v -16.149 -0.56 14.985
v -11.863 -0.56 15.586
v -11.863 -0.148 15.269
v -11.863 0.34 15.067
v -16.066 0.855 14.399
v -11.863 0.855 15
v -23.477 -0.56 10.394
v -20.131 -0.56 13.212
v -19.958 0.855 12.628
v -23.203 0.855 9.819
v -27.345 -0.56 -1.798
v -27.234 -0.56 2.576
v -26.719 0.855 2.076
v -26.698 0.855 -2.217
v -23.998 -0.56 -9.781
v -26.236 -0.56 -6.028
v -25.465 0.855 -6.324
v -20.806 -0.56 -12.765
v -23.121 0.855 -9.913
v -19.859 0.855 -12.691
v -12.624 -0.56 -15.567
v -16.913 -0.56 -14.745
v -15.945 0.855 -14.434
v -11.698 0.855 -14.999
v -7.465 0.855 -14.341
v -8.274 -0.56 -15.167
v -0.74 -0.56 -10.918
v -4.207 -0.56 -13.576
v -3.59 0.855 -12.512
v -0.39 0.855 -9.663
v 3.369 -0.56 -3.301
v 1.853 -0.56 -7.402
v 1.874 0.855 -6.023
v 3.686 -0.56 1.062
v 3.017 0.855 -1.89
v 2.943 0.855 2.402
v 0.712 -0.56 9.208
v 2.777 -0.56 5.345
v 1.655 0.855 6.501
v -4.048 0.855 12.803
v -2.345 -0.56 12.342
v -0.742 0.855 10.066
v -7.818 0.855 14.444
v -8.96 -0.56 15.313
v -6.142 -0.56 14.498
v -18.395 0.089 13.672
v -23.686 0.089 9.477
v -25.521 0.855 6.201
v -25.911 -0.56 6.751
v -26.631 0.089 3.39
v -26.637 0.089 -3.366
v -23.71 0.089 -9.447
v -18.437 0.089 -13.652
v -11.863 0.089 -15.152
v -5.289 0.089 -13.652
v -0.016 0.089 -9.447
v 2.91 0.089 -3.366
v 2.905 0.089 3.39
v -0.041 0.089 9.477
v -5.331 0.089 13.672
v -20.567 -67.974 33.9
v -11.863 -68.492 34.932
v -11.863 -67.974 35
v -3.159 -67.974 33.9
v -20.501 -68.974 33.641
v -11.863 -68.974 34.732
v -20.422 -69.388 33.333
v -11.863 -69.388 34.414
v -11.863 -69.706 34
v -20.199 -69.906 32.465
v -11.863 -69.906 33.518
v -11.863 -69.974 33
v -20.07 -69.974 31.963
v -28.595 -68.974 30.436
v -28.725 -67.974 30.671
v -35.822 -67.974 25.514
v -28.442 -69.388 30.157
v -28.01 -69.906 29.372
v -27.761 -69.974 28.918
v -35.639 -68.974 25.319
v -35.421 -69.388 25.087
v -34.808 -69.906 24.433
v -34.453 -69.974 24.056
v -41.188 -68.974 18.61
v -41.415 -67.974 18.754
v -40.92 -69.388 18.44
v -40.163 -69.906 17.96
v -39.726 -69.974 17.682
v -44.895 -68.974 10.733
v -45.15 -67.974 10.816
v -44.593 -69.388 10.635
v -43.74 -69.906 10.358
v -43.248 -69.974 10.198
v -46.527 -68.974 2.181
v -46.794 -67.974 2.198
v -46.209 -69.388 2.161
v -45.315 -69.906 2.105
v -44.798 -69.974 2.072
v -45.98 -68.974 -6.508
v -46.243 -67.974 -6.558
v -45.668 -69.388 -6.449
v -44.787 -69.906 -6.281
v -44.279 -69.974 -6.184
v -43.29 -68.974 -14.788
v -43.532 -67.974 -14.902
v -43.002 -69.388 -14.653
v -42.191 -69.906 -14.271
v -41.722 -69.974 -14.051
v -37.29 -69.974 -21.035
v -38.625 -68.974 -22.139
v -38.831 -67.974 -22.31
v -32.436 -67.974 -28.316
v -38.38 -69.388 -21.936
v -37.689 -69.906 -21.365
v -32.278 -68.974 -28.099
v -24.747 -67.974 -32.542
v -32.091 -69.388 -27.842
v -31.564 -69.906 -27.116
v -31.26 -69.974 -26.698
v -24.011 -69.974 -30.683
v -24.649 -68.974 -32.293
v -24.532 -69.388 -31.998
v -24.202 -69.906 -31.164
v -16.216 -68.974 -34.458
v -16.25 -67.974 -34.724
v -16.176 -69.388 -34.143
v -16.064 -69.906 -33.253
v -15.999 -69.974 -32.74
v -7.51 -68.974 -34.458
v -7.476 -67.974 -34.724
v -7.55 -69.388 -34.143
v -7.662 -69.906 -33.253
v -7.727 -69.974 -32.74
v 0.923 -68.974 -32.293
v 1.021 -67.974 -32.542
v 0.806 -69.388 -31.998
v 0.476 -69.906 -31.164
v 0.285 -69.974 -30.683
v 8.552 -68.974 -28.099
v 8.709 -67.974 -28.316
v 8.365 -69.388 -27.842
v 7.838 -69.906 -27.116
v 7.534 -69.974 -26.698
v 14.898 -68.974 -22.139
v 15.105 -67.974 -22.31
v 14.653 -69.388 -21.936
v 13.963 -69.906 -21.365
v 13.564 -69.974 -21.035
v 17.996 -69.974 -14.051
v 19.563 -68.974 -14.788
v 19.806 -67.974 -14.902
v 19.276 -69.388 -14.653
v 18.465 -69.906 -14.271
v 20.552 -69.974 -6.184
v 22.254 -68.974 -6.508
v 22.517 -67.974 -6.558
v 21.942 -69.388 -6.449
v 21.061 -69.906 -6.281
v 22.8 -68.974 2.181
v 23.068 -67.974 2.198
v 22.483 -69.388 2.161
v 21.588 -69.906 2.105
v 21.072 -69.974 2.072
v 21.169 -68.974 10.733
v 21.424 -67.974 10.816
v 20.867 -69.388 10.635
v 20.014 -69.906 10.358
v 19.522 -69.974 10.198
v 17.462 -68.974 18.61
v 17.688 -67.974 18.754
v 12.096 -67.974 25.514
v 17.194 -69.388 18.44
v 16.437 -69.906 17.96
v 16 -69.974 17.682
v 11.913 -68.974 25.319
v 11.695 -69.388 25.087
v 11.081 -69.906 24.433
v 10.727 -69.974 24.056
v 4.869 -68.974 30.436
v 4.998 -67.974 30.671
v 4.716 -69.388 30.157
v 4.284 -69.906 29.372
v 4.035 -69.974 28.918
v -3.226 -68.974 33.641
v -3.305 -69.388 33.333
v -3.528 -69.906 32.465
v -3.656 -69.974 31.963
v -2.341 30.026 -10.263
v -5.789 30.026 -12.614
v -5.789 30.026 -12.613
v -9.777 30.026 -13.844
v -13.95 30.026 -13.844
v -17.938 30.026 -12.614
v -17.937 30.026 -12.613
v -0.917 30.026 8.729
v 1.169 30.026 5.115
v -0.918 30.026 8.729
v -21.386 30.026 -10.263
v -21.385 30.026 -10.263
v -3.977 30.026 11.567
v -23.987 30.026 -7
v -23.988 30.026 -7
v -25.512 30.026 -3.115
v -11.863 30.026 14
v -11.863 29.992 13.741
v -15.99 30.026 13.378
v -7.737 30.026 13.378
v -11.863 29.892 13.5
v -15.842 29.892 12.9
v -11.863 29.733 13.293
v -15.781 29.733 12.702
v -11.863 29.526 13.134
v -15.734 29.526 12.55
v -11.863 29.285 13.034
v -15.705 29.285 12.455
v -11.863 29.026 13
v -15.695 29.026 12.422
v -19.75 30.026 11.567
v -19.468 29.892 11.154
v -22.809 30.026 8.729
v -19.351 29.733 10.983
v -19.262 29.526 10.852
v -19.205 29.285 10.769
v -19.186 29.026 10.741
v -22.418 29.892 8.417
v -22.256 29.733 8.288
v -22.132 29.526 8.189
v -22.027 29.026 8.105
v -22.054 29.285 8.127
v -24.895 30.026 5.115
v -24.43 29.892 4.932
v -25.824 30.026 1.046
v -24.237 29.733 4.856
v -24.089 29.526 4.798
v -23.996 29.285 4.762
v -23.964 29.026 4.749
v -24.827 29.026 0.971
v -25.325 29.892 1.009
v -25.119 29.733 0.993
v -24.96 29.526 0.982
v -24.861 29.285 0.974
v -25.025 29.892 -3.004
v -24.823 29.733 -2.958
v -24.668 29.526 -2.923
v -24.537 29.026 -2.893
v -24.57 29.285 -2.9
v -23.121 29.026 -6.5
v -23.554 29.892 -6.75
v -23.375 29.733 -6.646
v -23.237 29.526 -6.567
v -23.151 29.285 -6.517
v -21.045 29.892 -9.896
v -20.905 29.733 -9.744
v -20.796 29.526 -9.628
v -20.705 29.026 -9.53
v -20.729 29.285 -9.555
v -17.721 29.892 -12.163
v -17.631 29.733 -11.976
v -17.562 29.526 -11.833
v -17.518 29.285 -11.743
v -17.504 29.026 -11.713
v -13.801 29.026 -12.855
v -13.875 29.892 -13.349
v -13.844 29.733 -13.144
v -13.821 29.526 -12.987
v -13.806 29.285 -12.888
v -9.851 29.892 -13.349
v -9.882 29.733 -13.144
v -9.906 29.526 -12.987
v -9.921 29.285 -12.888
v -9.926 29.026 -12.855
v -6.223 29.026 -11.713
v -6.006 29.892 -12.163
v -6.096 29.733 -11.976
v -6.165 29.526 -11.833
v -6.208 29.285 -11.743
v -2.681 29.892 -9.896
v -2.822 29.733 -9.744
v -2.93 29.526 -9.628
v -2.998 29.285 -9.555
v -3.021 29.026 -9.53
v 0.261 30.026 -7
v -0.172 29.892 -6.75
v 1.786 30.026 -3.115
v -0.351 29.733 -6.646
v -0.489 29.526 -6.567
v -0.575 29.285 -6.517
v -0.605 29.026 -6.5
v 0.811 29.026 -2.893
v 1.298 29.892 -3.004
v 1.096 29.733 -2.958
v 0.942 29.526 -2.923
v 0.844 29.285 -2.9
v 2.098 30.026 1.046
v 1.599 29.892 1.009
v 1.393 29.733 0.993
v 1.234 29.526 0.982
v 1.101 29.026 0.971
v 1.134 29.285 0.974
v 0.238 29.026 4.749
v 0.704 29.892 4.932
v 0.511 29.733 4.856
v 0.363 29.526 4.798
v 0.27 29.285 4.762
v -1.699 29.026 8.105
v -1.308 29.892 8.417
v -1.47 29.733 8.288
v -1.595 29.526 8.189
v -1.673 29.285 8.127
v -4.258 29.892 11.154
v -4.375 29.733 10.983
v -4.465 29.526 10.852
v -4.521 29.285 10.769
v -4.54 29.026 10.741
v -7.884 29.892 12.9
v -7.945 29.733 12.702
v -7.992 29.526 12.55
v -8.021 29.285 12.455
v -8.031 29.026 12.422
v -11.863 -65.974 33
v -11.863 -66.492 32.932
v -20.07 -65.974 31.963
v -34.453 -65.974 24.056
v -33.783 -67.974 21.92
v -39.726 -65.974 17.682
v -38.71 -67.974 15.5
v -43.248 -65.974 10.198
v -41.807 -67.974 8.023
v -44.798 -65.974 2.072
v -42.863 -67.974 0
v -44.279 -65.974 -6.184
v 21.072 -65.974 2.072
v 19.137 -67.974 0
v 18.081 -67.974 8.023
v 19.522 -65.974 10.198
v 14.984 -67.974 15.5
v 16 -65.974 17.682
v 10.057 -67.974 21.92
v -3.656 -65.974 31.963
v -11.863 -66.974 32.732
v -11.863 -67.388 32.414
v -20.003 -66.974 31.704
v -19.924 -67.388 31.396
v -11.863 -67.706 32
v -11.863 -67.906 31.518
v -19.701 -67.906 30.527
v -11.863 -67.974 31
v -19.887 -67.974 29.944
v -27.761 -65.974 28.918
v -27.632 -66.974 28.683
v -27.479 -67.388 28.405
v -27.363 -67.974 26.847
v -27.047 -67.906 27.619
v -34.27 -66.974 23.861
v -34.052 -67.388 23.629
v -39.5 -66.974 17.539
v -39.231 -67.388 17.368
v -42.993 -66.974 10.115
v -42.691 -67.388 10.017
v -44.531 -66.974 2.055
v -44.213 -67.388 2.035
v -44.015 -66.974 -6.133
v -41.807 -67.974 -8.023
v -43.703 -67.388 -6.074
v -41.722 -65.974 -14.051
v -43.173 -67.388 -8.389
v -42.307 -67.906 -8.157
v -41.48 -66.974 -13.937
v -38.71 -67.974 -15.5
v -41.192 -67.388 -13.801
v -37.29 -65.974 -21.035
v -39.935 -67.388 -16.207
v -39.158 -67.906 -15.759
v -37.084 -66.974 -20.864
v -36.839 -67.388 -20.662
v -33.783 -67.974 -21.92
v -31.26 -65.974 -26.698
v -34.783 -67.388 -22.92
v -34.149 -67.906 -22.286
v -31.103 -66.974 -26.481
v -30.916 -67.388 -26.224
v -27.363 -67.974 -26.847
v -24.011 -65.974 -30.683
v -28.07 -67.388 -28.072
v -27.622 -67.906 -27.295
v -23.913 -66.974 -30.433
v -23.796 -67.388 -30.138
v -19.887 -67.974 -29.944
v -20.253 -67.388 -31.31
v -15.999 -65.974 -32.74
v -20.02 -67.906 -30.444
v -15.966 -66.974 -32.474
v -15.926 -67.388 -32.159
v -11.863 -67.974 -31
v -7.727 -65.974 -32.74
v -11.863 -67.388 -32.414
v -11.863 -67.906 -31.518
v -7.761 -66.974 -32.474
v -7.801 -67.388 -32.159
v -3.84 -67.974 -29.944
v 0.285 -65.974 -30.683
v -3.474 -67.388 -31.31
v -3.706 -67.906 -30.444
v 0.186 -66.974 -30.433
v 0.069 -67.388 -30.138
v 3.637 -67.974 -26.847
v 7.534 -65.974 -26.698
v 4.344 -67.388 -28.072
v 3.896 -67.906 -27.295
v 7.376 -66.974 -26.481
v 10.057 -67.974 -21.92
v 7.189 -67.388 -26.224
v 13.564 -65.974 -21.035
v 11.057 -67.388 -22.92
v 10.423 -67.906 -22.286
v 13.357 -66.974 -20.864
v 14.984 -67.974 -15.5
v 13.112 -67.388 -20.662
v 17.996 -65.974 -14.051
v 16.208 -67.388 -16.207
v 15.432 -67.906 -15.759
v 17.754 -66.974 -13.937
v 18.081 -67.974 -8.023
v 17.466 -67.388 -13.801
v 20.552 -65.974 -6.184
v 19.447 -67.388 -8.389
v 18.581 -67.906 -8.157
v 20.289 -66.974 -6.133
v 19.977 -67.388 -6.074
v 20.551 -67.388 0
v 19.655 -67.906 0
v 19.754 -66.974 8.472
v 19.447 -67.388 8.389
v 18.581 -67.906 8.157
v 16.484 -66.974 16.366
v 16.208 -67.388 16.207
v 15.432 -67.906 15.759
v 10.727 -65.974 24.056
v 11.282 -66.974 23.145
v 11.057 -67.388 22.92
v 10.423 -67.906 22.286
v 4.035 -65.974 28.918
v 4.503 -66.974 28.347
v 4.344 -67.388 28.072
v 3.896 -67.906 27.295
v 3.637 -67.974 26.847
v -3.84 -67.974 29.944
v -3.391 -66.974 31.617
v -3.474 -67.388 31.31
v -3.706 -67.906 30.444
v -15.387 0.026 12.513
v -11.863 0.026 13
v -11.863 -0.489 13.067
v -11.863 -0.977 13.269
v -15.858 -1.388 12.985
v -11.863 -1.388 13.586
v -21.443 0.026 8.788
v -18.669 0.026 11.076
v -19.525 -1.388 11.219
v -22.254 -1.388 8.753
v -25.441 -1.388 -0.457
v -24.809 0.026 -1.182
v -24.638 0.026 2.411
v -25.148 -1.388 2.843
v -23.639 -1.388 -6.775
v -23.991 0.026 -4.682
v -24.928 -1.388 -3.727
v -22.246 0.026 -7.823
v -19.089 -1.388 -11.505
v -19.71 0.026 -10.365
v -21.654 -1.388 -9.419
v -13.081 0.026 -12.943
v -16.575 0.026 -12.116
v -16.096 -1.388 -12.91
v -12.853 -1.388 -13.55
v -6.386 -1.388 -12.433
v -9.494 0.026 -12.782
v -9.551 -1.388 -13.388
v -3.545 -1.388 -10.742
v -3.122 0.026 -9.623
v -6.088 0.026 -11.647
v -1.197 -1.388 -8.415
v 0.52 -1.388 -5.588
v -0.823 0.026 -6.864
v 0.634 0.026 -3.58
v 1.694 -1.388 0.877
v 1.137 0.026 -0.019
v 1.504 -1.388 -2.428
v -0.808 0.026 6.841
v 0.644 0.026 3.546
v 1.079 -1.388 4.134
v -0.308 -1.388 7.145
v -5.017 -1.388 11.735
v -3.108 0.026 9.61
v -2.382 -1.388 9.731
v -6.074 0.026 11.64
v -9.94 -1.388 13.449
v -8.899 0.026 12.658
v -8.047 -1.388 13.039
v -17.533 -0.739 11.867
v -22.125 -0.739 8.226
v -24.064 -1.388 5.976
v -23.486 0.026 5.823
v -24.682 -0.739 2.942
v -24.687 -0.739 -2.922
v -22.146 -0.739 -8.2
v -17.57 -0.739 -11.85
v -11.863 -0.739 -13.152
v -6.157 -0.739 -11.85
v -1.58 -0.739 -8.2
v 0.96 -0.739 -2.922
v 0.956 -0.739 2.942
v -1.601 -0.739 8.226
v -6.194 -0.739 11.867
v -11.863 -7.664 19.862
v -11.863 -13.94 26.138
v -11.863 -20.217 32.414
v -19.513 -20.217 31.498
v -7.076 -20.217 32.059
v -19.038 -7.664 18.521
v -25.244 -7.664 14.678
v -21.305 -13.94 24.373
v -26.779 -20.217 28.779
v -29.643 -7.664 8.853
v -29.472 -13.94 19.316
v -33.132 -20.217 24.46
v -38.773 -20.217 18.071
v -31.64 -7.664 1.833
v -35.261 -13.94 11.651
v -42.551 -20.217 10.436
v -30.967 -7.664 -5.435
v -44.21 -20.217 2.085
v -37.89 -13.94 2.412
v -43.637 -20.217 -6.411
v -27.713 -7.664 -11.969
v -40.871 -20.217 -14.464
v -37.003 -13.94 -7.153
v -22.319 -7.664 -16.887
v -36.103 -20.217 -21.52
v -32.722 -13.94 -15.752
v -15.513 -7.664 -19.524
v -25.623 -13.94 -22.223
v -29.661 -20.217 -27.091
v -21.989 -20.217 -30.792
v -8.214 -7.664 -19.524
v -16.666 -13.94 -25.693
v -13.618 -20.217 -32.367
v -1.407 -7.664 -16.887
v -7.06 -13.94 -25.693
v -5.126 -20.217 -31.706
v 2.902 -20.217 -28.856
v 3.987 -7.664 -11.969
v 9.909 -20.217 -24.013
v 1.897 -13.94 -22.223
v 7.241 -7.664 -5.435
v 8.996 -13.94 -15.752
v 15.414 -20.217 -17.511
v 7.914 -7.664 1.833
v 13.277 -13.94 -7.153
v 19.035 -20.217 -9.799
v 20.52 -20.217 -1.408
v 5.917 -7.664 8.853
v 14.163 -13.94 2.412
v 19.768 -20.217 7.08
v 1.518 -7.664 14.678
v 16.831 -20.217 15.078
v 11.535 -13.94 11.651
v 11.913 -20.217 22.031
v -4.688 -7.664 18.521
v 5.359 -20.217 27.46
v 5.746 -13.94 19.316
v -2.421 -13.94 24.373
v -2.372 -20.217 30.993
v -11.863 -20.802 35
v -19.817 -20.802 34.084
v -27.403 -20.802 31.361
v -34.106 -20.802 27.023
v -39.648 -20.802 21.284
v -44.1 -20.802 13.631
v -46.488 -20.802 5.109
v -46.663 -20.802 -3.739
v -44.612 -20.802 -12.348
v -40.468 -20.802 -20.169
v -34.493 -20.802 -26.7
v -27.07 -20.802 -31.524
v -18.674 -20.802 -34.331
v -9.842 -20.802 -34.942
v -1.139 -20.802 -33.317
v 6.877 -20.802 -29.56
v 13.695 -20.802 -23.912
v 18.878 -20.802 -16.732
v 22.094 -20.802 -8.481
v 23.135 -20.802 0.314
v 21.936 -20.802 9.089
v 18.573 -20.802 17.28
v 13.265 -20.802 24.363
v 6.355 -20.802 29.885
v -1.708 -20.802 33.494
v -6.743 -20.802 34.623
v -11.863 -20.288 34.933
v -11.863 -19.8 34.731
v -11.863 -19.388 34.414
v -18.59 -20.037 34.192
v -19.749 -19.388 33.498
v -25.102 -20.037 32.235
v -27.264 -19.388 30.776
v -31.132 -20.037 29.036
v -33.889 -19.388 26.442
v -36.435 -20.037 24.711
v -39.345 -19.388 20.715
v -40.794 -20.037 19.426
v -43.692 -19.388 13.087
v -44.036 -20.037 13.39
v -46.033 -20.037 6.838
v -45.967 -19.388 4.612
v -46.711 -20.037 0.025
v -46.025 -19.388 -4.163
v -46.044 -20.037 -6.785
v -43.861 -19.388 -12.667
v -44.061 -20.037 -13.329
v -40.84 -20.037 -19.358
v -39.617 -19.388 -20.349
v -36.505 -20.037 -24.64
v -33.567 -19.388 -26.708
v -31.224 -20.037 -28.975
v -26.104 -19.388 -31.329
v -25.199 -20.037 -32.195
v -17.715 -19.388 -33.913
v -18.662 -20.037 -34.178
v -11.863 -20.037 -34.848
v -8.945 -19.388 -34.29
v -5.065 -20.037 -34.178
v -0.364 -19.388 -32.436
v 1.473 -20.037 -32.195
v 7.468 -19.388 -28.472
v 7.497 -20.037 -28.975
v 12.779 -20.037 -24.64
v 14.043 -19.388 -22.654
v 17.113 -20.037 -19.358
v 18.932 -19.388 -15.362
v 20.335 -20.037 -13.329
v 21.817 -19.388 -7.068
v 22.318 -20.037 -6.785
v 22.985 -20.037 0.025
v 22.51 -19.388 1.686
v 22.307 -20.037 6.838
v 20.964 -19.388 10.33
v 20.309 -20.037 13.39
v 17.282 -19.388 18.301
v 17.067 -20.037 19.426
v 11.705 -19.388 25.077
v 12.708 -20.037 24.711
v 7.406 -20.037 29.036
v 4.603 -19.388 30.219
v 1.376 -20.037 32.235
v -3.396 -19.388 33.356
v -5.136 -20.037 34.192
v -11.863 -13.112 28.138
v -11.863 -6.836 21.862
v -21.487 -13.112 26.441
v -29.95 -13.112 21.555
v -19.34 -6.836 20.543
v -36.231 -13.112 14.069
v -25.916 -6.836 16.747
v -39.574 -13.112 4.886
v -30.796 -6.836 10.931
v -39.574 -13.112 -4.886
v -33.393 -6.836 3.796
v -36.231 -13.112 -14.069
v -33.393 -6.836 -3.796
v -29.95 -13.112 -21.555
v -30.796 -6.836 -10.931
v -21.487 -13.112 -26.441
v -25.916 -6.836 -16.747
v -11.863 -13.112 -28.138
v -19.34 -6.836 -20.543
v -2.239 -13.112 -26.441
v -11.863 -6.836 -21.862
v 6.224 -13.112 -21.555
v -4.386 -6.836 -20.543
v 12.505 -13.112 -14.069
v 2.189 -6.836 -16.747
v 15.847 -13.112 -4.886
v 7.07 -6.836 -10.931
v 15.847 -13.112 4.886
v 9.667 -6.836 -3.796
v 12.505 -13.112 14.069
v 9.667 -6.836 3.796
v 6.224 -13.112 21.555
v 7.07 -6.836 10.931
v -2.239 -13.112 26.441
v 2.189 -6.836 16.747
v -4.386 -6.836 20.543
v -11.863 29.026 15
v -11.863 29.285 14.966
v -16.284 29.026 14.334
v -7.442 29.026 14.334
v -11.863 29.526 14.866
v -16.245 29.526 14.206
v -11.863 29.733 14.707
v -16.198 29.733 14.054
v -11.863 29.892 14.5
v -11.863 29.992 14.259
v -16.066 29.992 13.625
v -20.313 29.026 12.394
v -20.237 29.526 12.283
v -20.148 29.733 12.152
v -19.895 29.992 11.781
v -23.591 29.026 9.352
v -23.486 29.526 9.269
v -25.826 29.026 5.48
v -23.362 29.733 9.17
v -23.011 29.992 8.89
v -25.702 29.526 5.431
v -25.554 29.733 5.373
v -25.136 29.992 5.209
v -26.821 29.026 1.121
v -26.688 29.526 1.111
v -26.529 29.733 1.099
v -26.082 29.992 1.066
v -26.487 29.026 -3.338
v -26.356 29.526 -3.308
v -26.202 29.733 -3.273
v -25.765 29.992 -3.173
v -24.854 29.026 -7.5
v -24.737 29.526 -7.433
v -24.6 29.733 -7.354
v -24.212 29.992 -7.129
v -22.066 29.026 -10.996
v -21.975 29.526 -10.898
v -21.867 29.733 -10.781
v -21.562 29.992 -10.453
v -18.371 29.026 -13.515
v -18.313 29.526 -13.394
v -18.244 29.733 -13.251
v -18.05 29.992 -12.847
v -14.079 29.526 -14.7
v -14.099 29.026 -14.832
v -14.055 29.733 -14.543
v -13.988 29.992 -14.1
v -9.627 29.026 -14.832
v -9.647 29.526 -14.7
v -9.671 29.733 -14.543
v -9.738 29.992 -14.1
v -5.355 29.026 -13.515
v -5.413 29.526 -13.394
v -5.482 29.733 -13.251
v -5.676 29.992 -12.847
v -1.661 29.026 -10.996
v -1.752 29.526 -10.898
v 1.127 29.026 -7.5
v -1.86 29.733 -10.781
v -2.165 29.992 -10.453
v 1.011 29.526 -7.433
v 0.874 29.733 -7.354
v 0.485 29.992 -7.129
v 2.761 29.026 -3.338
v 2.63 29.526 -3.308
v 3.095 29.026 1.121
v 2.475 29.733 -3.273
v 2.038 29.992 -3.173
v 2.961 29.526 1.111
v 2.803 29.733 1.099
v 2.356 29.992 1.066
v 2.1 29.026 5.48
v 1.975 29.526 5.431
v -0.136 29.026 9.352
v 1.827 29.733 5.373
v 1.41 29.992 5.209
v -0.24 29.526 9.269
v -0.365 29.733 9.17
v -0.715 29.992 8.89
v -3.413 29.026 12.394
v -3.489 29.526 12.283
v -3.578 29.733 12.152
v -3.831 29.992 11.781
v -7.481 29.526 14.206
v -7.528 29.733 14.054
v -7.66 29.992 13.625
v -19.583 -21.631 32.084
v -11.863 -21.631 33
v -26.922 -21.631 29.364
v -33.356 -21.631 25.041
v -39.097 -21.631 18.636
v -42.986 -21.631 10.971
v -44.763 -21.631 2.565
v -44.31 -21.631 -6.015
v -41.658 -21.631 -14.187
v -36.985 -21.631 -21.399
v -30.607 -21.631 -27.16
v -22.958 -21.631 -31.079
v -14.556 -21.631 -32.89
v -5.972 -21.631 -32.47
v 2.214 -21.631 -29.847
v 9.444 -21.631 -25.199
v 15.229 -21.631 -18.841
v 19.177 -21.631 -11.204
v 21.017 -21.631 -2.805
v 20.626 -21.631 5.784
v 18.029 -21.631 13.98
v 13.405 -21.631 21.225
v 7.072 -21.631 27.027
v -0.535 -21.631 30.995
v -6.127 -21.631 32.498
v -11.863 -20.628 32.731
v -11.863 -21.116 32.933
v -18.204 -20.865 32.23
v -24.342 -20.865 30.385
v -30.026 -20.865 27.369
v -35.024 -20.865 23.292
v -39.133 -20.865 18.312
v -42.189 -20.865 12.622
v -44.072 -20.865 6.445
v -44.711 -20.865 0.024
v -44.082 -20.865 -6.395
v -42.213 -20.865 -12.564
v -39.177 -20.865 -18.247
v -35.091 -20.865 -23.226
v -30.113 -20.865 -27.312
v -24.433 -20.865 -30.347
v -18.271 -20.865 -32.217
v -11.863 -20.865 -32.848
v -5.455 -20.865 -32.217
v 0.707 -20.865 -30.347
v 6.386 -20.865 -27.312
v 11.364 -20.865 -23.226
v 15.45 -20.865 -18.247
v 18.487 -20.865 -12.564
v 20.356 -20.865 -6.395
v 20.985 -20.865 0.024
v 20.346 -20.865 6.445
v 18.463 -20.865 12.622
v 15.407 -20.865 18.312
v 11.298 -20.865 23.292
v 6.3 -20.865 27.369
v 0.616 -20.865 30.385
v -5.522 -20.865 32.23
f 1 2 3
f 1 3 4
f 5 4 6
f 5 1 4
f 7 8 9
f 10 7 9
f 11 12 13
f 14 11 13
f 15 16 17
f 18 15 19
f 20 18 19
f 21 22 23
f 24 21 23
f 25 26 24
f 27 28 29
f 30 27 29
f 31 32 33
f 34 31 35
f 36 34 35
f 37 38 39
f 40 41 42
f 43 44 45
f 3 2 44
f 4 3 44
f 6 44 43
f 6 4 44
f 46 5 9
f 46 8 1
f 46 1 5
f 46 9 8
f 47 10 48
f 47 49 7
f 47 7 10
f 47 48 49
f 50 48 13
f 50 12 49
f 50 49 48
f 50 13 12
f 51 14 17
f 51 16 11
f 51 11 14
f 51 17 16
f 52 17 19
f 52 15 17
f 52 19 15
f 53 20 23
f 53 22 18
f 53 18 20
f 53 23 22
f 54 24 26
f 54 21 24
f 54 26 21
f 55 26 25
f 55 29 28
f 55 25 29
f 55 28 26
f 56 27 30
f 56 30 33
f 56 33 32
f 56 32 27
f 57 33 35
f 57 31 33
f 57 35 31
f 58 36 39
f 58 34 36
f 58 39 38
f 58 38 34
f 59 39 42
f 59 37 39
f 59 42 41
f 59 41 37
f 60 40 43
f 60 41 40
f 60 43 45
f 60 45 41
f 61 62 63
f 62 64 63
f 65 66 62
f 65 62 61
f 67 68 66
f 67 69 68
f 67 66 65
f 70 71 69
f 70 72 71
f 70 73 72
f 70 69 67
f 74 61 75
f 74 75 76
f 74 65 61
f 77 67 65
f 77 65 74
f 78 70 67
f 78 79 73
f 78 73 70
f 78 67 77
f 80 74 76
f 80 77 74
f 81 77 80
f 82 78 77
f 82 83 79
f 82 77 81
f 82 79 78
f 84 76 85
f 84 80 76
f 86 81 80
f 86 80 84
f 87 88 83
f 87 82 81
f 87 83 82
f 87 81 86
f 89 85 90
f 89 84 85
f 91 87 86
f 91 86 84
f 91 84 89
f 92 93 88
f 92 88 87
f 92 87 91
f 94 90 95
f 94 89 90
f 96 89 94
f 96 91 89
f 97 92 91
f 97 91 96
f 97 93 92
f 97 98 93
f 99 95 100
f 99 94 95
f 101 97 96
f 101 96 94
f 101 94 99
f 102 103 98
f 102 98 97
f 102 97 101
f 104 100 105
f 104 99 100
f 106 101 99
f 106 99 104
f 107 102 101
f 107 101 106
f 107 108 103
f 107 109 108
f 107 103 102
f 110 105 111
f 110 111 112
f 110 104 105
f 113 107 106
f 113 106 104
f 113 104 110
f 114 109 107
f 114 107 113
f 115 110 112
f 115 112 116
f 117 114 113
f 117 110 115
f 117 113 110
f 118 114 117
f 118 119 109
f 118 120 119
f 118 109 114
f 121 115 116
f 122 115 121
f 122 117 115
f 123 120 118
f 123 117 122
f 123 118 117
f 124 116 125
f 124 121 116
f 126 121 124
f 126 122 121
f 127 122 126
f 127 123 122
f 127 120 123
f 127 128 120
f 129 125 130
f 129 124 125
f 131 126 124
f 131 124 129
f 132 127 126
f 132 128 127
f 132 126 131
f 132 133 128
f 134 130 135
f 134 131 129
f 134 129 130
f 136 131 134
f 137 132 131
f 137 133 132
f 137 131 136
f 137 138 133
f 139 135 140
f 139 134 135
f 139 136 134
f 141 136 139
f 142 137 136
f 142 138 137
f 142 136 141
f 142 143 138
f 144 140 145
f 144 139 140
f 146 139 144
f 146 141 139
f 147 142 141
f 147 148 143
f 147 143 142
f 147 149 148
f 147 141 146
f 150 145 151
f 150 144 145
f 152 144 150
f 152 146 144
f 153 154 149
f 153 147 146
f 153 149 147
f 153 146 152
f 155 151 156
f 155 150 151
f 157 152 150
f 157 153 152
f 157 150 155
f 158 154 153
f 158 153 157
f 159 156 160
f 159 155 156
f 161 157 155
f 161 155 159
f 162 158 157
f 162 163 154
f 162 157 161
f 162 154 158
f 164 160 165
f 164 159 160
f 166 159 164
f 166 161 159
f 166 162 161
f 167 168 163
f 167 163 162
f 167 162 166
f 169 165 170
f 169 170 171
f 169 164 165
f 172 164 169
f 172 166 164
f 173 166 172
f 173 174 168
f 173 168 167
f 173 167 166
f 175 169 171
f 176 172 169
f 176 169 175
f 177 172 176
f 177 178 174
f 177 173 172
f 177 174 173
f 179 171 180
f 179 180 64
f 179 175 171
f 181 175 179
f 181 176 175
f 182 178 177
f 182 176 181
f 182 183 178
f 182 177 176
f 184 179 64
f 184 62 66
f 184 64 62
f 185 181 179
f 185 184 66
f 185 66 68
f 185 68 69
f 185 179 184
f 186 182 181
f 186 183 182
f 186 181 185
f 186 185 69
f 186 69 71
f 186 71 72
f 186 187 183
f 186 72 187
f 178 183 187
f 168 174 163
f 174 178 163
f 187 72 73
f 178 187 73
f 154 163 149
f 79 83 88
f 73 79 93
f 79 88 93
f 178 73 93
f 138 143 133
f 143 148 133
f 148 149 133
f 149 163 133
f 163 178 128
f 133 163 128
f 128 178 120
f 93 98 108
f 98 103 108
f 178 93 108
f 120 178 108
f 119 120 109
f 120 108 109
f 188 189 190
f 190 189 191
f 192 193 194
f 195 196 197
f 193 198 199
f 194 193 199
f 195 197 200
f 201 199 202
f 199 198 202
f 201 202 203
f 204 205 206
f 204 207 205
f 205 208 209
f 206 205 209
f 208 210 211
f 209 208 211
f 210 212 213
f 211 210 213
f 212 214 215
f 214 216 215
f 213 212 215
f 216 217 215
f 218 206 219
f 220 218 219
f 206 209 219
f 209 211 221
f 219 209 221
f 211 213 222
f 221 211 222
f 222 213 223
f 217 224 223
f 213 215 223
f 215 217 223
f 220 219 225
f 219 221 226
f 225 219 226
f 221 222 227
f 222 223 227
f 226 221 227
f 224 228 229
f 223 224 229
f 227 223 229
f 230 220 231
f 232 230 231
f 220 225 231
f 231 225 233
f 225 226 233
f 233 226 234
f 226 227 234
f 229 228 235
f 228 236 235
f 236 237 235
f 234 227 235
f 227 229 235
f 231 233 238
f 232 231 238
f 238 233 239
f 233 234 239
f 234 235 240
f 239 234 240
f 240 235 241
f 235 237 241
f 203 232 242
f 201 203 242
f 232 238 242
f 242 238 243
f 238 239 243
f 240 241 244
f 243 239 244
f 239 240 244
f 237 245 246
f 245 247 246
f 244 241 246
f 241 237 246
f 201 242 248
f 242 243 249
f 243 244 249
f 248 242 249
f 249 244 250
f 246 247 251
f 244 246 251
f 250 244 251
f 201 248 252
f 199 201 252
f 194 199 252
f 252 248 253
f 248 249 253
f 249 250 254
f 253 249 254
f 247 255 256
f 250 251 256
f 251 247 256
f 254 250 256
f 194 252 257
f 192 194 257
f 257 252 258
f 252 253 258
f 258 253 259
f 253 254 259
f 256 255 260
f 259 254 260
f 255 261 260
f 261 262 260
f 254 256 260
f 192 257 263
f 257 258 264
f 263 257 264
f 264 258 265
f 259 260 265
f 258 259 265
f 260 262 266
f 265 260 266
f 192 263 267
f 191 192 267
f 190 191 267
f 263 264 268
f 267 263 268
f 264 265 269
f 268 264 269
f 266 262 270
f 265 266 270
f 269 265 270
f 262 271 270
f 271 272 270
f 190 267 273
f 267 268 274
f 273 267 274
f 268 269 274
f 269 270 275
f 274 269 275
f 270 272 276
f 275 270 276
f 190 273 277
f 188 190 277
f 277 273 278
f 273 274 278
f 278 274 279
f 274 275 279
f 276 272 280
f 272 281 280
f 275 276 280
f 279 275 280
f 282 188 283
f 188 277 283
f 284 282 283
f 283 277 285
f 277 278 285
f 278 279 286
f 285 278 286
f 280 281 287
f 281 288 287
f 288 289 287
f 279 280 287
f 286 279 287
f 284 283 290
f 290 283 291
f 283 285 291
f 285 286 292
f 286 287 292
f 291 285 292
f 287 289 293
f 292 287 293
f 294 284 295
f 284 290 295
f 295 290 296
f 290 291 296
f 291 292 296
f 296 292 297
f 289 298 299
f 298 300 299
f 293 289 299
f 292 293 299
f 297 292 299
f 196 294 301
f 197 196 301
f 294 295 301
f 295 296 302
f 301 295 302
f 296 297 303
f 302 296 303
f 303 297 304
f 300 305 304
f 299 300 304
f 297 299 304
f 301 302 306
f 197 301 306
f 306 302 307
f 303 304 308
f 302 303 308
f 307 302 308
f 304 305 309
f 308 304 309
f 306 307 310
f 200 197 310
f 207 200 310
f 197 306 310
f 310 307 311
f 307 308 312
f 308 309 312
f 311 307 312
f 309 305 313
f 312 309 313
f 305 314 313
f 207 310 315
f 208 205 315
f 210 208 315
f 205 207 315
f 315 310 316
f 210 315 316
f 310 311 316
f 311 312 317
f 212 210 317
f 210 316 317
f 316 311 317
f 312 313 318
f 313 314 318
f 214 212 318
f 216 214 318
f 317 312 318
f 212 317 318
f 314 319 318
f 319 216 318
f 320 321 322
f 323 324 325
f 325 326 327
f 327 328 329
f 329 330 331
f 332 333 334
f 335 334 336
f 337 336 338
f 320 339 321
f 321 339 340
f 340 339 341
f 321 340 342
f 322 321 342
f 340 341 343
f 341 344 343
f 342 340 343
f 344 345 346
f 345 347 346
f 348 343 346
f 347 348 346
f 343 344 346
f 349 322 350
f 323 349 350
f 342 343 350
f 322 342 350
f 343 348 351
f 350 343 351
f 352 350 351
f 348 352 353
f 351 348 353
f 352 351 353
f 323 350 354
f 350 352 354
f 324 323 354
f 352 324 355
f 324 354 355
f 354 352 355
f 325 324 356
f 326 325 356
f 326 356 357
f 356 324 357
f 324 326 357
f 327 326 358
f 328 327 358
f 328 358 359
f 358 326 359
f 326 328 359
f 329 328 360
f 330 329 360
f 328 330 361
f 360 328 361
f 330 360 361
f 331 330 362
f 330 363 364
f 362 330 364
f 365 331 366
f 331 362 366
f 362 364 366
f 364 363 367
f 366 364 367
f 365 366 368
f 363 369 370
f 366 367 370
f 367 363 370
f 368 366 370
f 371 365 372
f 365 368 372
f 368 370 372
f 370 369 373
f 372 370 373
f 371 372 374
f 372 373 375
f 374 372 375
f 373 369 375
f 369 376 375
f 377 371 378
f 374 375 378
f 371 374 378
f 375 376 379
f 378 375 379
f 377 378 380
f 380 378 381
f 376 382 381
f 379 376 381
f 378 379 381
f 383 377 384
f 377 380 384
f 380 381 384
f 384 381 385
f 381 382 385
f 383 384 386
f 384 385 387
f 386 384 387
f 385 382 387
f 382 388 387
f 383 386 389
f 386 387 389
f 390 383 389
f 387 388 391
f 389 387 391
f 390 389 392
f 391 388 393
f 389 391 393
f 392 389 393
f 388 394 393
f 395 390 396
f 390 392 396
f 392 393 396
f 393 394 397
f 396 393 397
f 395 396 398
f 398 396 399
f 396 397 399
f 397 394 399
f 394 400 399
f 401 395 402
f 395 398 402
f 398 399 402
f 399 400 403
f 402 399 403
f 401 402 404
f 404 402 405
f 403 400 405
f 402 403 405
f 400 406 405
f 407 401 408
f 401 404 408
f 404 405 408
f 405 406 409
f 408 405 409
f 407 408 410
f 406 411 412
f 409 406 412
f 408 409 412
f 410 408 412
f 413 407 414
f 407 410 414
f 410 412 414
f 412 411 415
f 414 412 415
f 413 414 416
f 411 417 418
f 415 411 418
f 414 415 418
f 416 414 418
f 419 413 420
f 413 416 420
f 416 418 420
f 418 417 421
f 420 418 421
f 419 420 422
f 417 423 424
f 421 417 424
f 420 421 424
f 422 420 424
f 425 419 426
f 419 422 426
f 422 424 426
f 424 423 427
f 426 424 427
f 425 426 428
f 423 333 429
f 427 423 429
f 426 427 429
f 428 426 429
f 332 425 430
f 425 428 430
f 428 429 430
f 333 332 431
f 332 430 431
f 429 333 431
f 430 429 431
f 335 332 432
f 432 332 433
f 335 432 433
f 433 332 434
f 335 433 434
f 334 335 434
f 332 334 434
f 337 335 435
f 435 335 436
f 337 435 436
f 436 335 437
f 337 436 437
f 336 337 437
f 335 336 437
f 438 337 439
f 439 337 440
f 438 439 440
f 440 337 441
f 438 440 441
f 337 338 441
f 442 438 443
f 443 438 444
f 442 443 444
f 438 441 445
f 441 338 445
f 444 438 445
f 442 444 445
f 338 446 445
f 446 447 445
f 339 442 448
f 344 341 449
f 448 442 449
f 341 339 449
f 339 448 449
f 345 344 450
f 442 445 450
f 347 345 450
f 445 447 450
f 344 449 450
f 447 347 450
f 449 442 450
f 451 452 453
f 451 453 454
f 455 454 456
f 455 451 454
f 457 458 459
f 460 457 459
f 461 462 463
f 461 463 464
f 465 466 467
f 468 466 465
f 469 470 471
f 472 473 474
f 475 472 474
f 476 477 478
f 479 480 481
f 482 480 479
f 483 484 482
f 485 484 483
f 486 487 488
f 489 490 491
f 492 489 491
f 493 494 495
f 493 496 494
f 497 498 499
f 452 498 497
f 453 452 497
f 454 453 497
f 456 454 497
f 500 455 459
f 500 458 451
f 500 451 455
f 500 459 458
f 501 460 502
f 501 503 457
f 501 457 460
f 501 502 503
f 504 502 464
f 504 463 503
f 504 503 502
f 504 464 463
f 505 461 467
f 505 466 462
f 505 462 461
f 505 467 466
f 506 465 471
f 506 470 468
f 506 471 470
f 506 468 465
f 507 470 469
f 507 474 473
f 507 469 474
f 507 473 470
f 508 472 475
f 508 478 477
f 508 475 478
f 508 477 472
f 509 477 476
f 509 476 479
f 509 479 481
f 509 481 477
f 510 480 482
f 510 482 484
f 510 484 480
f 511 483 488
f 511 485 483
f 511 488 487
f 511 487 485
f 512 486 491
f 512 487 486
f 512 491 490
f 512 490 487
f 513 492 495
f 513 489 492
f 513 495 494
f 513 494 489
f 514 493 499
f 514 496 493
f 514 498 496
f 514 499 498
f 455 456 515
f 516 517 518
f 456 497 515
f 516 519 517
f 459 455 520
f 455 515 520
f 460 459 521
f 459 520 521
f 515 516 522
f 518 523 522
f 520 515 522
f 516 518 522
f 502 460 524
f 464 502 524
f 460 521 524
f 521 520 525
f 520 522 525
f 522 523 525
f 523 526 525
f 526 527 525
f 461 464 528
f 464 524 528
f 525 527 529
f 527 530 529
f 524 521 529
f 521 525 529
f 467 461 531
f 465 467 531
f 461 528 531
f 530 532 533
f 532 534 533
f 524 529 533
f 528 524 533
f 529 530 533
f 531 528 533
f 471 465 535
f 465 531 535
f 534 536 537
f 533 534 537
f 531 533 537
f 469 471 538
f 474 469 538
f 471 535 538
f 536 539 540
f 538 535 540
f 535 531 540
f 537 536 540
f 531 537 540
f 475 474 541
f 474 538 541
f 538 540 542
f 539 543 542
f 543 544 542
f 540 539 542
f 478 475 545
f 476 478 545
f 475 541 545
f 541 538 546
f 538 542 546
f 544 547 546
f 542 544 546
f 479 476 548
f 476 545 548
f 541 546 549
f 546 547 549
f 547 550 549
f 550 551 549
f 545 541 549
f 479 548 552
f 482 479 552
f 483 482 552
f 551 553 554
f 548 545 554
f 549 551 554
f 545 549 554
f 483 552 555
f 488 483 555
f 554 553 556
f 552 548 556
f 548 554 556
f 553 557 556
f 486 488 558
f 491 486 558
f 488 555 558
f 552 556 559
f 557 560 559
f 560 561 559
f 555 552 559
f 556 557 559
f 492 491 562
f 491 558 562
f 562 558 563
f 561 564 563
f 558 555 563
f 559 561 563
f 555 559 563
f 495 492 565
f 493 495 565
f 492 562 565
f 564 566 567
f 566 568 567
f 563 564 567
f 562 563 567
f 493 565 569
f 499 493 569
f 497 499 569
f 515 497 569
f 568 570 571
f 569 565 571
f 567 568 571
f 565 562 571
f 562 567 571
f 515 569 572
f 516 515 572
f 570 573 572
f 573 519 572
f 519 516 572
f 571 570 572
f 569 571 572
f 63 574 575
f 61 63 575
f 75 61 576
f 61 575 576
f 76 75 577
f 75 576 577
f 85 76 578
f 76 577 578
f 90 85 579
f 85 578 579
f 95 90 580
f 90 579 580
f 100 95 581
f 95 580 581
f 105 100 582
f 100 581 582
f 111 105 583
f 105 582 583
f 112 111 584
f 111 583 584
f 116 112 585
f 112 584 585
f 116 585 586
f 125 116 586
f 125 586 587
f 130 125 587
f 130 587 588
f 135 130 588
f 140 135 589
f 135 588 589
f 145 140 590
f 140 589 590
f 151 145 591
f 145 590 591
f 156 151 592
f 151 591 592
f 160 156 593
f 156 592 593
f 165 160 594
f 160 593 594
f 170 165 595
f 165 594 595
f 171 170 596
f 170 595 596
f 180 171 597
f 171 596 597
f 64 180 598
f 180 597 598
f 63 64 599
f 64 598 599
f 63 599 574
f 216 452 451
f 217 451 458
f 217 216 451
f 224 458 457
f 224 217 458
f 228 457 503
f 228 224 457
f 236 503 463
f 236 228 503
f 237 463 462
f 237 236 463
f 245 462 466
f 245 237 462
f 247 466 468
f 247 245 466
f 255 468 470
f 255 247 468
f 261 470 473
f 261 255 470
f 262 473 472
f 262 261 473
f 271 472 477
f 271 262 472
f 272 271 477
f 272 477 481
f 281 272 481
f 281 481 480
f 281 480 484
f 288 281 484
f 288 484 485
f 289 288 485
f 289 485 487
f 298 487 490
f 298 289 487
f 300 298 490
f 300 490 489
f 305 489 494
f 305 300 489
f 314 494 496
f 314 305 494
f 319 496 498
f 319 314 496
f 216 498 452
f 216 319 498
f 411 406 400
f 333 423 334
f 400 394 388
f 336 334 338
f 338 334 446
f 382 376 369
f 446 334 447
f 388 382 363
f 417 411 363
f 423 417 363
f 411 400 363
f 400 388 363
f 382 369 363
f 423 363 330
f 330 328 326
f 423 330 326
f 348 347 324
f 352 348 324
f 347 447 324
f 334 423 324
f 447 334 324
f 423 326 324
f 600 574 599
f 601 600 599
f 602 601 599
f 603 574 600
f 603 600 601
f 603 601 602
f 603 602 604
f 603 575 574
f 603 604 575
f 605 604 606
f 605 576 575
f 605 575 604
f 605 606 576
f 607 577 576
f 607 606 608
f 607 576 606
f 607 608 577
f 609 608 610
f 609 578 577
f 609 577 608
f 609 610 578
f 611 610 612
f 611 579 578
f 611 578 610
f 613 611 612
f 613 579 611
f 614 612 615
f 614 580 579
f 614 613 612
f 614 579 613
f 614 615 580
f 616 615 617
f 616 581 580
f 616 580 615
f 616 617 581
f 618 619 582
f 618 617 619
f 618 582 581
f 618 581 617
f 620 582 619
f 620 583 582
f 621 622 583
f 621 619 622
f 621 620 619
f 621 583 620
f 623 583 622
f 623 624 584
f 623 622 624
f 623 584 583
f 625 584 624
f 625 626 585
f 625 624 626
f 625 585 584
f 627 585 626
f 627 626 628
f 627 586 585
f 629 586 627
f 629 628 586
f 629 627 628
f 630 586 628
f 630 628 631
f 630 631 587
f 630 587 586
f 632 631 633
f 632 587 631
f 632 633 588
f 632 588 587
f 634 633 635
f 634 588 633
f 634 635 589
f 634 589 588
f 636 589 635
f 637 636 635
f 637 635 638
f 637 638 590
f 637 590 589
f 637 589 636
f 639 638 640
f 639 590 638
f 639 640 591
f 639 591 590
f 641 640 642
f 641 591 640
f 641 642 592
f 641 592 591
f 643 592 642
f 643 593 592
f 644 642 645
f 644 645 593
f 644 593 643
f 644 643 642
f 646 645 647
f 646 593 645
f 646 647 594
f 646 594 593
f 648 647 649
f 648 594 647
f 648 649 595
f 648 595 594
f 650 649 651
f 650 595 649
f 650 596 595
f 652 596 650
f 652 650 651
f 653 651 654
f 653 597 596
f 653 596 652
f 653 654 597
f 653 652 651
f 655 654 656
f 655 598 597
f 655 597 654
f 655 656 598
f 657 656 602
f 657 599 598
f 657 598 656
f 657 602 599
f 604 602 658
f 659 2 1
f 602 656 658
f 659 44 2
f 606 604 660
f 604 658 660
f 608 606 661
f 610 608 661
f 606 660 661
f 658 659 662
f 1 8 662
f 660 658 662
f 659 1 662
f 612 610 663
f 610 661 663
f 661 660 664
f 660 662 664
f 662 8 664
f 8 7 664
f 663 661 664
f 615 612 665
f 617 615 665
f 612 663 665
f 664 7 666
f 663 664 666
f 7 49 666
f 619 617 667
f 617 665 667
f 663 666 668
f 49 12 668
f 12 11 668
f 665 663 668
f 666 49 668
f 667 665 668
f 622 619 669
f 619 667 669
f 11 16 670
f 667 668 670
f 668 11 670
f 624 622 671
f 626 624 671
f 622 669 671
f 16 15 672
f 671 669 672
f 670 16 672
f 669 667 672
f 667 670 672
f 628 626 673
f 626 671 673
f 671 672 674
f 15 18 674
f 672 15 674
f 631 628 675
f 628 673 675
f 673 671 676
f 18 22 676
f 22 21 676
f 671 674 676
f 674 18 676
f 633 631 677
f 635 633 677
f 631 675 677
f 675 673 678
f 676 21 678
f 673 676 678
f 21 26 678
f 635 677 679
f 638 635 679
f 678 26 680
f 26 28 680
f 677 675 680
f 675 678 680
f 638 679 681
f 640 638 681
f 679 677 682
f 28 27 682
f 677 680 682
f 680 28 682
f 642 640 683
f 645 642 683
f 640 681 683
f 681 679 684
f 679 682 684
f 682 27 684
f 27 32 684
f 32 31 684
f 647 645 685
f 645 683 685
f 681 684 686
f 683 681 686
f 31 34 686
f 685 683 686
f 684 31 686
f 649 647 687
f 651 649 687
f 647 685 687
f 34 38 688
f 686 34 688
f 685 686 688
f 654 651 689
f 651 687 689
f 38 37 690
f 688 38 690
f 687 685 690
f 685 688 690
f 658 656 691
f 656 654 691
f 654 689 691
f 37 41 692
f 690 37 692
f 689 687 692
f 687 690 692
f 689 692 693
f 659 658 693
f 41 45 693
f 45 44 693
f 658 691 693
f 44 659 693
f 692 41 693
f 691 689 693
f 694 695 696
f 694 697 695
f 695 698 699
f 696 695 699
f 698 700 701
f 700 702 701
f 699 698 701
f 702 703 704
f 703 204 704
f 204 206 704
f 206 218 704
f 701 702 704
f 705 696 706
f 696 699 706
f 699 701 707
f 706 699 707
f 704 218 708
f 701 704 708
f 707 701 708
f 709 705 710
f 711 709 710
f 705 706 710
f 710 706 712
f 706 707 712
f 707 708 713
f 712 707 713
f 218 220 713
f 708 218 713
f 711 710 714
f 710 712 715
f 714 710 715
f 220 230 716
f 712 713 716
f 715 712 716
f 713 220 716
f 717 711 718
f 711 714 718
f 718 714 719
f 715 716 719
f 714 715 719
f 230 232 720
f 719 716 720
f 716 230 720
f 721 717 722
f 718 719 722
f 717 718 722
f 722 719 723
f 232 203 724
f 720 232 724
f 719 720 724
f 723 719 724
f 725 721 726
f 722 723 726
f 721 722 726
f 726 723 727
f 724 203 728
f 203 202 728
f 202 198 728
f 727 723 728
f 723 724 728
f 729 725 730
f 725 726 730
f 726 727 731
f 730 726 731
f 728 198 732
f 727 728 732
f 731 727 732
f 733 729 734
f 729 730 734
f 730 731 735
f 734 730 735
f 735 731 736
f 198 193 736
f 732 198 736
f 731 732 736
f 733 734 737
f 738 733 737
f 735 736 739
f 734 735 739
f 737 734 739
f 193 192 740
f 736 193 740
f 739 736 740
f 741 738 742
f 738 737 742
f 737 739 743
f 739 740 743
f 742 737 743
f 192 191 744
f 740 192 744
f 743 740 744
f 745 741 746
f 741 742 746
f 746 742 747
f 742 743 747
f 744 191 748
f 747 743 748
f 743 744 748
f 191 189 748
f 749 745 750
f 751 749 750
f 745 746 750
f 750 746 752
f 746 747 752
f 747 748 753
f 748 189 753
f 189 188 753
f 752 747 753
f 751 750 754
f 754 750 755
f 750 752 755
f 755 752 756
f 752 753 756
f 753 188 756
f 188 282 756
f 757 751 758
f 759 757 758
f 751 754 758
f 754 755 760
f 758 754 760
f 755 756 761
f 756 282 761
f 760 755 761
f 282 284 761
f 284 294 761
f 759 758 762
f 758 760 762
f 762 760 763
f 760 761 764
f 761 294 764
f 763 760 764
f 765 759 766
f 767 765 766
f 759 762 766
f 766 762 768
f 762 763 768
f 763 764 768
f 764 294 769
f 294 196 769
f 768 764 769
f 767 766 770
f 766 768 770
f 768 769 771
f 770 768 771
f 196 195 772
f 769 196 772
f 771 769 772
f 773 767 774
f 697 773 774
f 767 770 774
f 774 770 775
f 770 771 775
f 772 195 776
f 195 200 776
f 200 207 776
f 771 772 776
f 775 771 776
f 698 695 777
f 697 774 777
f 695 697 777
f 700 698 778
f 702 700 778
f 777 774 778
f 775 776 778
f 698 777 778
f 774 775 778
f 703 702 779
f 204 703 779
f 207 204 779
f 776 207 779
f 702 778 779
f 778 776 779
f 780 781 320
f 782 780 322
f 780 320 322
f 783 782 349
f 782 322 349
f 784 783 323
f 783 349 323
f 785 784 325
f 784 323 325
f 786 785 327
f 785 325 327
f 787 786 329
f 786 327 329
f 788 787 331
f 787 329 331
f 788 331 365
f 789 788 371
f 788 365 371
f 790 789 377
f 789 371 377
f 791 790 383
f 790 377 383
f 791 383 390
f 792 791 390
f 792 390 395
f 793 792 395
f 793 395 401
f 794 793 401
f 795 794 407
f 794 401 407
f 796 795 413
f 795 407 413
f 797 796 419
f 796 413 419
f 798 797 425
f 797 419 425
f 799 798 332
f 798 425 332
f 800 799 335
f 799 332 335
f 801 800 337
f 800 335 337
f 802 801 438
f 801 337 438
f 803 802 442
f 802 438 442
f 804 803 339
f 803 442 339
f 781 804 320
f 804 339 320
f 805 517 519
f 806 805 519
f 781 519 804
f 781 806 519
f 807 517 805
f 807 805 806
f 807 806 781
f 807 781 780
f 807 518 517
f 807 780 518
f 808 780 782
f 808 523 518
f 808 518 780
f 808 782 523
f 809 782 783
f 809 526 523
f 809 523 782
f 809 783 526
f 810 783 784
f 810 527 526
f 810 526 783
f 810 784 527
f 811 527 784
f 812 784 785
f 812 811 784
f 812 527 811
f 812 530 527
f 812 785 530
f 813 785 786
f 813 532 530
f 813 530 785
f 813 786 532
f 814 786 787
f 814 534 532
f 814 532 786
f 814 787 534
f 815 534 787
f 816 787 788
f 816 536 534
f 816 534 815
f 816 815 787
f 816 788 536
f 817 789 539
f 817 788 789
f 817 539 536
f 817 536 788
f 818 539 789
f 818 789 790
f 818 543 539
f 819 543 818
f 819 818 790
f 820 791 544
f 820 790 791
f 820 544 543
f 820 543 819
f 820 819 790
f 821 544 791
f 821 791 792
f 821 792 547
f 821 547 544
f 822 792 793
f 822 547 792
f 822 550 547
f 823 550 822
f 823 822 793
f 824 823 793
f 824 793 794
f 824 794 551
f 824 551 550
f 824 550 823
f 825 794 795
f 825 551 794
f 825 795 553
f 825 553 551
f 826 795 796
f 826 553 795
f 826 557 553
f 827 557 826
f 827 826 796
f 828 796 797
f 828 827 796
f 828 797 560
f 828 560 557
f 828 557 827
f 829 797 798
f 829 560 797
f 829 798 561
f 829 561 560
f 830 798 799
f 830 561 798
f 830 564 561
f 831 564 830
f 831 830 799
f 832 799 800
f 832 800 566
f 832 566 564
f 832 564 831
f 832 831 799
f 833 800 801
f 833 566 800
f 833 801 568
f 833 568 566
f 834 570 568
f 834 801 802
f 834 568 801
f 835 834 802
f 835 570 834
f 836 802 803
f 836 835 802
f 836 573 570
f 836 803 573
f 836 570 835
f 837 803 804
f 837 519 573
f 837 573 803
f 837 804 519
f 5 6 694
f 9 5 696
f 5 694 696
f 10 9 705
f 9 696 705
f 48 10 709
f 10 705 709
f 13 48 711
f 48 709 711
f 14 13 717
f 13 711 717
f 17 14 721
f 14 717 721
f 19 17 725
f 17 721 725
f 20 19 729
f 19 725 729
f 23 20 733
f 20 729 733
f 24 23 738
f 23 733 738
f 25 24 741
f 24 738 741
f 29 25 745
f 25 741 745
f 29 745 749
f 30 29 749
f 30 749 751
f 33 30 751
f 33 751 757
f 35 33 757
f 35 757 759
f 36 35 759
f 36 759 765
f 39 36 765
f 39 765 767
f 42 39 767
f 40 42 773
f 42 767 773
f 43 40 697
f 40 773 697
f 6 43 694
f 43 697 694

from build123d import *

# Parameters (mm, degrees)
FILLET_3_R = 2
FILLET_4_R = 1
FILLET_5_R = 2


with BuildPart() as part:
    # 스케치1 → 회전1 (revolve)
    with BuildSketch(Plane.XY, mode=Mode.PRIVATE) as revolve_1_sk:
        Polygon((-11.86312796, -69.973918824), (-46.86312796, -69.973918824), (-46.86312796, -19.973918824), (-26.86312796, 0.026081176), (-26.86312796, 30.026081176), (-24.86312796, 30.026081176), (-24.86312796, 28.026081176), (-24.86312796, -0.802345949), (-44.86312796, -20.802345949), (-44.86312796, -67.973918824), (-11.86312796, -67.973918824), align=None)
    revolve(revolve_1_sk.sketch.rotate(Axis((-11.86312796, 50.325613141, 0), (0, -1, 0)), 270), axis=Axis((-11.86312796, 50.325613141, 0), (0, -1, 0)))

    # 필렛3
    fillet_3_edges = [part.edges().sort_by_distance(p)[0] for p in [
        (-11.86312796, 0.026081176, -15),
        (-11.86312796, -19.973918824, -35),
        (-11.86312796, -67.973918824, -33),
        (-11.86312796, -20.802345949, -33),
        (-11.86312796, -0.802345949, -13),
    ]]
    fillet(fillet_3_edges, radius=FILLET_3_R)

    # 필렛4
    fillet_4_edges = [part.edges().sort_by_distance(p)[0] for p in [
        (-11.86312796, 30.026081176, -15),
        (-11.86312796, 30.026081176, -13),
    ]]
    fillet(fillet_4_edges, radius=FILLET_4_R - 0.0001)  # a hair under: the kernel refuses the full size

    # 필렛5
    fillet_5_edges = [part.edges().sort_by_distance(p)[0] for p in [
        (-11.86312796, -69.973918824, -35),
    ]]
    fillet(fillet_5_edges, radius=FILLET_5_R)


solid = part.part
